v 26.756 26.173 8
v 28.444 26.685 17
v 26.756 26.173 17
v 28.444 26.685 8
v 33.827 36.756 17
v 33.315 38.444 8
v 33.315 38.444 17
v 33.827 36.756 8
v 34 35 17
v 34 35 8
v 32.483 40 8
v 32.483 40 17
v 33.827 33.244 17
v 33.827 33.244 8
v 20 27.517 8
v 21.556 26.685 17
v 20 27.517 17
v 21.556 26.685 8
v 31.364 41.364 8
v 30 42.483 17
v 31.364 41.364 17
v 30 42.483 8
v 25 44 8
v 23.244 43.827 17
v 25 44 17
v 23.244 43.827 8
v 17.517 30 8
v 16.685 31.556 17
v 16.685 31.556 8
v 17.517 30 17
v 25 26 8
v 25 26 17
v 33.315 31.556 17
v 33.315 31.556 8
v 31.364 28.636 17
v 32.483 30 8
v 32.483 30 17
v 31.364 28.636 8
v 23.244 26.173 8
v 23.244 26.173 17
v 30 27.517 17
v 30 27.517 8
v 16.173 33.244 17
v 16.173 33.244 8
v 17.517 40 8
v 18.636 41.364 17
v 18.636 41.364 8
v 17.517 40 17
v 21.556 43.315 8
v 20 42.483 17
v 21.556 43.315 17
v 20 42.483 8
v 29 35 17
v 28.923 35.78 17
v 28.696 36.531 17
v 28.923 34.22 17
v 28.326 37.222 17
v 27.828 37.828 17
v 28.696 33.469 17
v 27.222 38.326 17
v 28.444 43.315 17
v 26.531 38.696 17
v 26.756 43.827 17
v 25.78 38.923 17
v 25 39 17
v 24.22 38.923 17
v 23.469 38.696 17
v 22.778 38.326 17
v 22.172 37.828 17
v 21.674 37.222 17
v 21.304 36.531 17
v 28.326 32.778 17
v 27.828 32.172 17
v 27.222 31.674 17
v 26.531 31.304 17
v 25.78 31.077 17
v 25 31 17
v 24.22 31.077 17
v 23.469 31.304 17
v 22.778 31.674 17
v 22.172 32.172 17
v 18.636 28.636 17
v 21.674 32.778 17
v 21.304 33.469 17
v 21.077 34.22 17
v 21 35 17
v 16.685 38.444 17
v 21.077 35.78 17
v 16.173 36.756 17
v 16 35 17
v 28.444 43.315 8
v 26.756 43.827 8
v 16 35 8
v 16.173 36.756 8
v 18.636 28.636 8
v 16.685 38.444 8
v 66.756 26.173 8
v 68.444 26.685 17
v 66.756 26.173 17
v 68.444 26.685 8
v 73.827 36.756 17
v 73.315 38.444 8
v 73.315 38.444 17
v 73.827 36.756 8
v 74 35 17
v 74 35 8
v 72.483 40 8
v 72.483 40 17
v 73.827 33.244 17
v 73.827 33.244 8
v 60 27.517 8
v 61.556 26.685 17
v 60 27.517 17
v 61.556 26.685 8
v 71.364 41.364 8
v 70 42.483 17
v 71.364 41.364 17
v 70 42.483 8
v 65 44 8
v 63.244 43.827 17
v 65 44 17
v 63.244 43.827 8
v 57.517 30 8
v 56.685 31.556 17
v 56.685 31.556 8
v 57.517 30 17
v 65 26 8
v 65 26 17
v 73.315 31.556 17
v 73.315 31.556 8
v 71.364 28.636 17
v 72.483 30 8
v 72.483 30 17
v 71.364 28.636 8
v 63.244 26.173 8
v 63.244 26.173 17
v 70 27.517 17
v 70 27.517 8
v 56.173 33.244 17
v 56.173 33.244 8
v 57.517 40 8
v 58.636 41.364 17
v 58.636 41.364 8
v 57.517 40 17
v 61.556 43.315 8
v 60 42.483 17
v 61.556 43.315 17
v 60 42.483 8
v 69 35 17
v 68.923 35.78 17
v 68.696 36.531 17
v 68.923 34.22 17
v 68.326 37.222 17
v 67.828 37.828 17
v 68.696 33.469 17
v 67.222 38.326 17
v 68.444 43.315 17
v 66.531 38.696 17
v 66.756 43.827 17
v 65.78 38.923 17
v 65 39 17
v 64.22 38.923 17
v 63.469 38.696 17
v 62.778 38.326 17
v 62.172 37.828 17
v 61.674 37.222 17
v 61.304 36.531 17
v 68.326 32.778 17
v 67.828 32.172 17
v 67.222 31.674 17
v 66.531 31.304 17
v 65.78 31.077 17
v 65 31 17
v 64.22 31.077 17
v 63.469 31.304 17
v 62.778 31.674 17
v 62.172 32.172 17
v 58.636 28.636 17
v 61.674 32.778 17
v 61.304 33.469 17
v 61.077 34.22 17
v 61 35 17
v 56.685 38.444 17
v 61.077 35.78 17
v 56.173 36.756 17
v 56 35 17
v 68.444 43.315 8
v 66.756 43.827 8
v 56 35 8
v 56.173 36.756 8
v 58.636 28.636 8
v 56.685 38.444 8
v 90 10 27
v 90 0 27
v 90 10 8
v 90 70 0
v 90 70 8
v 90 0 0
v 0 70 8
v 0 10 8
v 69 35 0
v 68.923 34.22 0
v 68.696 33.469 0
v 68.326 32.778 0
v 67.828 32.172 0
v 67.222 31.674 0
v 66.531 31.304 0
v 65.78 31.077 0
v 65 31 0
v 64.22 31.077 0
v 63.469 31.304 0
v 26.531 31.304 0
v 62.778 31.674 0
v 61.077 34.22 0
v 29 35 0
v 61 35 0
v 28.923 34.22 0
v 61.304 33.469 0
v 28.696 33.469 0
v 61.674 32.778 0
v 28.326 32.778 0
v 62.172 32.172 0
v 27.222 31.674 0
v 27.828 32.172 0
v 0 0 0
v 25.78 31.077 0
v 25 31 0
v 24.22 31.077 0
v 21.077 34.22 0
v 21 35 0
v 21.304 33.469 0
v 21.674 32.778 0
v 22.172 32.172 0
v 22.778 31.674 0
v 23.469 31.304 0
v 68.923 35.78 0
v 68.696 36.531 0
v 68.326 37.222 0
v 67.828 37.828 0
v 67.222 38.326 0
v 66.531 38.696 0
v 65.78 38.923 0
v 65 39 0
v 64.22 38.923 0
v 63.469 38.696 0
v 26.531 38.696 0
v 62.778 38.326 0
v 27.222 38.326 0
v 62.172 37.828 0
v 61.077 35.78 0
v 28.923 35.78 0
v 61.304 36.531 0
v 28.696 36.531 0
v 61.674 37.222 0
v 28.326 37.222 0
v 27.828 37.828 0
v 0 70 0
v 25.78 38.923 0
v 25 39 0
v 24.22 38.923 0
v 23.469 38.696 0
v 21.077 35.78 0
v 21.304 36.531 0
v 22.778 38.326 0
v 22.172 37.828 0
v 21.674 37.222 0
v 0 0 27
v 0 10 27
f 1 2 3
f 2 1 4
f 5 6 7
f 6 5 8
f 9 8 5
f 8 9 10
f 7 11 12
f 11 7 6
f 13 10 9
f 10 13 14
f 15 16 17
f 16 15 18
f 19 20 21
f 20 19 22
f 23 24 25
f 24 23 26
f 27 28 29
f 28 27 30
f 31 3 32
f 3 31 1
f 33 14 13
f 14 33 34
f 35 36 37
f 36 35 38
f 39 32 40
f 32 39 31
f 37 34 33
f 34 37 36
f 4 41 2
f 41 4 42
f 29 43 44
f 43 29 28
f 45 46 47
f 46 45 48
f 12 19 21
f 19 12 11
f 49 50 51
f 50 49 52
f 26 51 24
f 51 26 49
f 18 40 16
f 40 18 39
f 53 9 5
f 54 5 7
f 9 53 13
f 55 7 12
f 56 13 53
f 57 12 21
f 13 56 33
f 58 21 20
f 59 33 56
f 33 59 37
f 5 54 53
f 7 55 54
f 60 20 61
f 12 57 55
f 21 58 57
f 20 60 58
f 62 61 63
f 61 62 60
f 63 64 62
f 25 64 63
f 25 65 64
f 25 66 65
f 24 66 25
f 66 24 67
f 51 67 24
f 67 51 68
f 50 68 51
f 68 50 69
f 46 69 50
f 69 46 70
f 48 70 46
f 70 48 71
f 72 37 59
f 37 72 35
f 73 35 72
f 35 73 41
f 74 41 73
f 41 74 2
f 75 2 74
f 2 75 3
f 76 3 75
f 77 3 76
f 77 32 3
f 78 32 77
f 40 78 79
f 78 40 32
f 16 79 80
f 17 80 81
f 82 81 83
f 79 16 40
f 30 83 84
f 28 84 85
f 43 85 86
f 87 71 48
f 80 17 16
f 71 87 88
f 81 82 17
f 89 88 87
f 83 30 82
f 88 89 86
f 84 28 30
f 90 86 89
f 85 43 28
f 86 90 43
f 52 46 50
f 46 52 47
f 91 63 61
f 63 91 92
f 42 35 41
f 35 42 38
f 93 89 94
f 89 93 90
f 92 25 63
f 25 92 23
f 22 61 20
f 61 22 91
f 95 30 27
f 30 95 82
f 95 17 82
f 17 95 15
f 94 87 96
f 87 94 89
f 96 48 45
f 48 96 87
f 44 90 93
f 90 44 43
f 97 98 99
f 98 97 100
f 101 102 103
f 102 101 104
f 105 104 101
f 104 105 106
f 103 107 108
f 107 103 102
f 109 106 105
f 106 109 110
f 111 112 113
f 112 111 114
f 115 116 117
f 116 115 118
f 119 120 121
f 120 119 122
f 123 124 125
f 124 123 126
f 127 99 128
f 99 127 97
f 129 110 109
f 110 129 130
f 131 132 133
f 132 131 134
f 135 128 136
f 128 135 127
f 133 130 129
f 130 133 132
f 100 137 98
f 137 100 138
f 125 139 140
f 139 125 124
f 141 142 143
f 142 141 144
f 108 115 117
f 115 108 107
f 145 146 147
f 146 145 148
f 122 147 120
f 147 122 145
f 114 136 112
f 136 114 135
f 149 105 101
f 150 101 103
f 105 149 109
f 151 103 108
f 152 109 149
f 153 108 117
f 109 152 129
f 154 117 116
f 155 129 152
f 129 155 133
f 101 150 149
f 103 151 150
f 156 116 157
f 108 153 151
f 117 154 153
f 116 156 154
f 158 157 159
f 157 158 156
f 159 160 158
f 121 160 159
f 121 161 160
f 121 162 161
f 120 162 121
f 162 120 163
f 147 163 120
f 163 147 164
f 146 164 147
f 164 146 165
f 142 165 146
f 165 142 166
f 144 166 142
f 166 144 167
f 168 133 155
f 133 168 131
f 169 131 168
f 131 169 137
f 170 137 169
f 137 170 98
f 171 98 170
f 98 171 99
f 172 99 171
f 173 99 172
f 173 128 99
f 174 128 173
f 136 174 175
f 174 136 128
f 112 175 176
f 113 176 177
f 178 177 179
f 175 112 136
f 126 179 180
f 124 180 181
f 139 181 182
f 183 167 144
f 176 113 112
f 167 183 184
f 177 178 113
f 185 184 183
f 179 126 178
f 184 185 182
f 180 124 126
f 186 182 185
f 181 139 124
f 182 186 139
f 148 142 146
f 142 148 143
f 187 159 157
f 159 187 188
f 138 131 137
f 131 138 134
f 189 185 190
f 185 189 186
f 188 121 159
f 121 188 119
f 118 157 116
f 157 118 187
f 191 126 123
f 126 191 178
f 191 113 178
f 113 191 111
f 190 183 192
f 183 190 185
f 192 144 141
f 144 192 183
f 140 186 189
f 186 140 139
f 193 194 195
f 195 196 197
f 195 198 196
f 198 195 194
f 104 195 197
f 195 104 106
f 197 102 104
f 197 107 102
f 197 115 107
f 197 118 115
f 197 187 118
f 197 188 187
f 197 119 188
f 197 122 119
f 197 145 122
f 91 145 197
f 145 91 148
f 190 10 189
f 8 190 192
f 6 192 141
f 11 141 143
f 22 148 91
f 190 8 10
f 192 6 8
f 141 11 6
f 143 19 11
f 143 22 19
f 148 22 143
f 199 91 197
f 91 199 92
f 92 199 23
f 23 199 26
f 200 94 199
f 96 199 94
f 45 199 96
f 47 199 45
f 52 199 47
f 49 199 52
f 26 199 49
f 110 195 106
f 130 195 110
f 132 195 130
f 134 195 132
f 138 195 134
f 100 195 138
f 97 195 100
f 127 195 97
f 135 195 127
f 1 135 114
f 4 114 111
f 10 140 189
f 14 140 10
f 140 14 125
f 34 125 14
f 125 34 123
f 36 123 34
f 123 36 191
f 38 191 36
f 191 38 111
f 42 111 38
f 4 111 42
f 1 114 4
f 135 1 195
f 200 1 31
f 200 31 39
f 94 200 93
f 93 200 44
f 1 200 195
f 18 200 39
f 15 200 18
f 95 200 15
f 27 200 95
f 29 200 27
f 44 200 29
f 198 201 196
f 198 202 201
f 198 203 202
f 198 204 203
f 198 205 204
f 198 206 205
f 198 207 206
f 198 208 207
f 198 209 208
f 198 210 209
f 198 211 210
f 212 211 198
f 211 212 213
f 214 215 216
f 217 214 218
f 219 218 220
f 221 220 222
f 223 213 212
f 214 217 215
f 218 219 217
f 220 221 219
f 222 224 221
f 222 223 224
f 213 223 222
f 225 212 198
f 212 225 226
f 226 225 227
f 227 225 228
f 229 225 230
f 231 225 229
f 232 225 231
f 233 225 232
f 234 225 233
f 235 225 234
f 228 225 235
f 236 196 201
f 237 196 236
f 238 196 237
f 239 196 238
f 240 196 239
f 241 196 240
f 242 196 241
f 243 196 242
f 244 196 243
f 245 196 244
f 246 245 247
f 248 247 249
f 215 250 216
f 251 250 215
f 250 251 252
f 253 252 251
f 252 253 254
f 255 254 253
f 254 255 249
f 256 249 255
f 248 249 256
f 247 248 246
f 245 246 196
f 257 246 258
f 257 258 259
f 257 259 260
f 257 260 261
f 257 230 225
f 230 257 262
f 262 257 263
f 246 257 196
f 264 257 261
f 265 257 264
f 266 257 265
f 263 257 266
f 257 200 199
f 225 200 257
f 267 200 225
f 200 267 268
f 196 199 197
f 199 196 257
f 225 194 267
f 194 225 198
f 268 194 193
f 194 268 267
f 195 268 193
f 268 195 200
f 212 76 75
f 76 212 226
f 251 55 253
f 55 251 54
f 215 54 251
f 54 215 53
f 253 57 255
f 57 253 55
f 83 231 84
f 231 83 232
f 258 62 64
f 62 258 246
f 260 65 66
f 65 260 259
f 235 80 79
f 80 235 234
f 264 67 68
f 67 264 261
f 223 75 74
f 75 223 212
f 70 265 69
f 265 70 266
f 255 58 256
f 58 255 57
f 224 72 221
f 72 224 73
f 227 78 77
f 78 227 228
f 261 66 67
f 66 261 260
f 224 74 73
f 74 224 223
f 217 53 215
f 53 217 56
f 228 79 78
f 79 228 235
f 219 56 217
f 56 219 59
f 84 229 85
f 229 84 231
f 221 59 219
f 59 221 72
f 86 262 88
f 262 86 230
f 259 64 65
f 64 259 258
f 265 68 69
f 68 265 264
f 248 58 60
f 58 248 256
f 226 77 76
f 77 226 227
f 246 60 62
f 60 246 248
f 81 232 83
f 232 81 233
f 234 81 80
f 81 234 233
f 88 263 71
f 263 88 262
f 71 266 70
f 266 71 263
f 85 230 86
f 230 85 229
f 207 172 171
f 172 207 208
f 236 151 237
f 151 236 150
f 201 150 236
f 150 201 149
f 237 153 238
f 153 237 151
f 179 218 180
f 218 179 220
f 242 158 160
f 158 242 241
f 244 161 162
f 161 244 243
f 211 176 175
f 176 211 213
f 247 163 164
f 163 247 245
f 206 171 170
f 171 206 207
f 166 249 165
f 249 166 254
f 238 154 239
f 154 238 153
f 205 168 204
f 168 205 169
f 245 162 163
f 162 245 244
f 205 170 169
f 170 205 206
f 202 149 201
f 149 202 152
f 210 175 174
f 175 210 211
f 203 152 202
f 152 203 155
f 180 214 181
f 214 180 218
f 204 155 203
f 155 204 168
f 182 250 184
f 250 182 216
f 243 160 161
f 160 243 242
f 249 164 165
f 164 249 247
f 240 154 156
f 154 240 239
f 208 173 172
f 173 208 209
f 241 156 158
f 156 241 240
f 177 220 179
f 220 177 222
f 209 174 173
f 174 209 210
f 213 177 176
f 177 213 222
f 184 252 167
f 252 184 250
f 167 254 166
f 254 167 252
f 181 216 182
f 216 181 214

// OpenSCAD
$fn = 32;

// ----------------------------------------------------------------------
// Drill jig: fence jig
// ----------------------------------------------------------------------

// --- parameters (mm) ---
plate_l = 90;             // plate length, X
plate_w = 70;             // plate width, Y
plate_t = 8;              // plate thickness
boss_d = 18;              // guide boss diameter
boss_h = 10;              // boss height above the plate
guide_d = 8;              // guide hole diameter
boss_pitch = 40;          // boss pitch
fence_h = 20;             // fence height above the plate
fence_t = 10;             // fence thickness

n_boss = 2;  // guide bosses
boss_x0 = (plate_l - (n_boss - 1) * boss_pitch) / 2;  // first boss X
boss_top = plate_t - 1 + boss_h;  // boss crown height
fence_top = plate_t - 1 + fence_h;  // fence crown height
total_h = max([fence_top, boss_top]);  // overall height

difference() {
  union() {
  cube([plate_l, plate_w, plate_t]);
  for (i = [0 : n_boss - 1])
    translate([boss_x0 + i * boss_pitch, plate_w / 2, plate_t - 1])
      cylinder(h = boss_h, d = boss_d);
  translate([0, 0, plate_t - 1]) cube([plate_l, fence_t, fence_h]);
  }
  for (i = [0 : n_boss - 1])
    translate([boss_x0 + i * boss_pitch, plate_w / 2, -1])
      cylinder(h = plate_t + boss_h, d = guide_d);
}
